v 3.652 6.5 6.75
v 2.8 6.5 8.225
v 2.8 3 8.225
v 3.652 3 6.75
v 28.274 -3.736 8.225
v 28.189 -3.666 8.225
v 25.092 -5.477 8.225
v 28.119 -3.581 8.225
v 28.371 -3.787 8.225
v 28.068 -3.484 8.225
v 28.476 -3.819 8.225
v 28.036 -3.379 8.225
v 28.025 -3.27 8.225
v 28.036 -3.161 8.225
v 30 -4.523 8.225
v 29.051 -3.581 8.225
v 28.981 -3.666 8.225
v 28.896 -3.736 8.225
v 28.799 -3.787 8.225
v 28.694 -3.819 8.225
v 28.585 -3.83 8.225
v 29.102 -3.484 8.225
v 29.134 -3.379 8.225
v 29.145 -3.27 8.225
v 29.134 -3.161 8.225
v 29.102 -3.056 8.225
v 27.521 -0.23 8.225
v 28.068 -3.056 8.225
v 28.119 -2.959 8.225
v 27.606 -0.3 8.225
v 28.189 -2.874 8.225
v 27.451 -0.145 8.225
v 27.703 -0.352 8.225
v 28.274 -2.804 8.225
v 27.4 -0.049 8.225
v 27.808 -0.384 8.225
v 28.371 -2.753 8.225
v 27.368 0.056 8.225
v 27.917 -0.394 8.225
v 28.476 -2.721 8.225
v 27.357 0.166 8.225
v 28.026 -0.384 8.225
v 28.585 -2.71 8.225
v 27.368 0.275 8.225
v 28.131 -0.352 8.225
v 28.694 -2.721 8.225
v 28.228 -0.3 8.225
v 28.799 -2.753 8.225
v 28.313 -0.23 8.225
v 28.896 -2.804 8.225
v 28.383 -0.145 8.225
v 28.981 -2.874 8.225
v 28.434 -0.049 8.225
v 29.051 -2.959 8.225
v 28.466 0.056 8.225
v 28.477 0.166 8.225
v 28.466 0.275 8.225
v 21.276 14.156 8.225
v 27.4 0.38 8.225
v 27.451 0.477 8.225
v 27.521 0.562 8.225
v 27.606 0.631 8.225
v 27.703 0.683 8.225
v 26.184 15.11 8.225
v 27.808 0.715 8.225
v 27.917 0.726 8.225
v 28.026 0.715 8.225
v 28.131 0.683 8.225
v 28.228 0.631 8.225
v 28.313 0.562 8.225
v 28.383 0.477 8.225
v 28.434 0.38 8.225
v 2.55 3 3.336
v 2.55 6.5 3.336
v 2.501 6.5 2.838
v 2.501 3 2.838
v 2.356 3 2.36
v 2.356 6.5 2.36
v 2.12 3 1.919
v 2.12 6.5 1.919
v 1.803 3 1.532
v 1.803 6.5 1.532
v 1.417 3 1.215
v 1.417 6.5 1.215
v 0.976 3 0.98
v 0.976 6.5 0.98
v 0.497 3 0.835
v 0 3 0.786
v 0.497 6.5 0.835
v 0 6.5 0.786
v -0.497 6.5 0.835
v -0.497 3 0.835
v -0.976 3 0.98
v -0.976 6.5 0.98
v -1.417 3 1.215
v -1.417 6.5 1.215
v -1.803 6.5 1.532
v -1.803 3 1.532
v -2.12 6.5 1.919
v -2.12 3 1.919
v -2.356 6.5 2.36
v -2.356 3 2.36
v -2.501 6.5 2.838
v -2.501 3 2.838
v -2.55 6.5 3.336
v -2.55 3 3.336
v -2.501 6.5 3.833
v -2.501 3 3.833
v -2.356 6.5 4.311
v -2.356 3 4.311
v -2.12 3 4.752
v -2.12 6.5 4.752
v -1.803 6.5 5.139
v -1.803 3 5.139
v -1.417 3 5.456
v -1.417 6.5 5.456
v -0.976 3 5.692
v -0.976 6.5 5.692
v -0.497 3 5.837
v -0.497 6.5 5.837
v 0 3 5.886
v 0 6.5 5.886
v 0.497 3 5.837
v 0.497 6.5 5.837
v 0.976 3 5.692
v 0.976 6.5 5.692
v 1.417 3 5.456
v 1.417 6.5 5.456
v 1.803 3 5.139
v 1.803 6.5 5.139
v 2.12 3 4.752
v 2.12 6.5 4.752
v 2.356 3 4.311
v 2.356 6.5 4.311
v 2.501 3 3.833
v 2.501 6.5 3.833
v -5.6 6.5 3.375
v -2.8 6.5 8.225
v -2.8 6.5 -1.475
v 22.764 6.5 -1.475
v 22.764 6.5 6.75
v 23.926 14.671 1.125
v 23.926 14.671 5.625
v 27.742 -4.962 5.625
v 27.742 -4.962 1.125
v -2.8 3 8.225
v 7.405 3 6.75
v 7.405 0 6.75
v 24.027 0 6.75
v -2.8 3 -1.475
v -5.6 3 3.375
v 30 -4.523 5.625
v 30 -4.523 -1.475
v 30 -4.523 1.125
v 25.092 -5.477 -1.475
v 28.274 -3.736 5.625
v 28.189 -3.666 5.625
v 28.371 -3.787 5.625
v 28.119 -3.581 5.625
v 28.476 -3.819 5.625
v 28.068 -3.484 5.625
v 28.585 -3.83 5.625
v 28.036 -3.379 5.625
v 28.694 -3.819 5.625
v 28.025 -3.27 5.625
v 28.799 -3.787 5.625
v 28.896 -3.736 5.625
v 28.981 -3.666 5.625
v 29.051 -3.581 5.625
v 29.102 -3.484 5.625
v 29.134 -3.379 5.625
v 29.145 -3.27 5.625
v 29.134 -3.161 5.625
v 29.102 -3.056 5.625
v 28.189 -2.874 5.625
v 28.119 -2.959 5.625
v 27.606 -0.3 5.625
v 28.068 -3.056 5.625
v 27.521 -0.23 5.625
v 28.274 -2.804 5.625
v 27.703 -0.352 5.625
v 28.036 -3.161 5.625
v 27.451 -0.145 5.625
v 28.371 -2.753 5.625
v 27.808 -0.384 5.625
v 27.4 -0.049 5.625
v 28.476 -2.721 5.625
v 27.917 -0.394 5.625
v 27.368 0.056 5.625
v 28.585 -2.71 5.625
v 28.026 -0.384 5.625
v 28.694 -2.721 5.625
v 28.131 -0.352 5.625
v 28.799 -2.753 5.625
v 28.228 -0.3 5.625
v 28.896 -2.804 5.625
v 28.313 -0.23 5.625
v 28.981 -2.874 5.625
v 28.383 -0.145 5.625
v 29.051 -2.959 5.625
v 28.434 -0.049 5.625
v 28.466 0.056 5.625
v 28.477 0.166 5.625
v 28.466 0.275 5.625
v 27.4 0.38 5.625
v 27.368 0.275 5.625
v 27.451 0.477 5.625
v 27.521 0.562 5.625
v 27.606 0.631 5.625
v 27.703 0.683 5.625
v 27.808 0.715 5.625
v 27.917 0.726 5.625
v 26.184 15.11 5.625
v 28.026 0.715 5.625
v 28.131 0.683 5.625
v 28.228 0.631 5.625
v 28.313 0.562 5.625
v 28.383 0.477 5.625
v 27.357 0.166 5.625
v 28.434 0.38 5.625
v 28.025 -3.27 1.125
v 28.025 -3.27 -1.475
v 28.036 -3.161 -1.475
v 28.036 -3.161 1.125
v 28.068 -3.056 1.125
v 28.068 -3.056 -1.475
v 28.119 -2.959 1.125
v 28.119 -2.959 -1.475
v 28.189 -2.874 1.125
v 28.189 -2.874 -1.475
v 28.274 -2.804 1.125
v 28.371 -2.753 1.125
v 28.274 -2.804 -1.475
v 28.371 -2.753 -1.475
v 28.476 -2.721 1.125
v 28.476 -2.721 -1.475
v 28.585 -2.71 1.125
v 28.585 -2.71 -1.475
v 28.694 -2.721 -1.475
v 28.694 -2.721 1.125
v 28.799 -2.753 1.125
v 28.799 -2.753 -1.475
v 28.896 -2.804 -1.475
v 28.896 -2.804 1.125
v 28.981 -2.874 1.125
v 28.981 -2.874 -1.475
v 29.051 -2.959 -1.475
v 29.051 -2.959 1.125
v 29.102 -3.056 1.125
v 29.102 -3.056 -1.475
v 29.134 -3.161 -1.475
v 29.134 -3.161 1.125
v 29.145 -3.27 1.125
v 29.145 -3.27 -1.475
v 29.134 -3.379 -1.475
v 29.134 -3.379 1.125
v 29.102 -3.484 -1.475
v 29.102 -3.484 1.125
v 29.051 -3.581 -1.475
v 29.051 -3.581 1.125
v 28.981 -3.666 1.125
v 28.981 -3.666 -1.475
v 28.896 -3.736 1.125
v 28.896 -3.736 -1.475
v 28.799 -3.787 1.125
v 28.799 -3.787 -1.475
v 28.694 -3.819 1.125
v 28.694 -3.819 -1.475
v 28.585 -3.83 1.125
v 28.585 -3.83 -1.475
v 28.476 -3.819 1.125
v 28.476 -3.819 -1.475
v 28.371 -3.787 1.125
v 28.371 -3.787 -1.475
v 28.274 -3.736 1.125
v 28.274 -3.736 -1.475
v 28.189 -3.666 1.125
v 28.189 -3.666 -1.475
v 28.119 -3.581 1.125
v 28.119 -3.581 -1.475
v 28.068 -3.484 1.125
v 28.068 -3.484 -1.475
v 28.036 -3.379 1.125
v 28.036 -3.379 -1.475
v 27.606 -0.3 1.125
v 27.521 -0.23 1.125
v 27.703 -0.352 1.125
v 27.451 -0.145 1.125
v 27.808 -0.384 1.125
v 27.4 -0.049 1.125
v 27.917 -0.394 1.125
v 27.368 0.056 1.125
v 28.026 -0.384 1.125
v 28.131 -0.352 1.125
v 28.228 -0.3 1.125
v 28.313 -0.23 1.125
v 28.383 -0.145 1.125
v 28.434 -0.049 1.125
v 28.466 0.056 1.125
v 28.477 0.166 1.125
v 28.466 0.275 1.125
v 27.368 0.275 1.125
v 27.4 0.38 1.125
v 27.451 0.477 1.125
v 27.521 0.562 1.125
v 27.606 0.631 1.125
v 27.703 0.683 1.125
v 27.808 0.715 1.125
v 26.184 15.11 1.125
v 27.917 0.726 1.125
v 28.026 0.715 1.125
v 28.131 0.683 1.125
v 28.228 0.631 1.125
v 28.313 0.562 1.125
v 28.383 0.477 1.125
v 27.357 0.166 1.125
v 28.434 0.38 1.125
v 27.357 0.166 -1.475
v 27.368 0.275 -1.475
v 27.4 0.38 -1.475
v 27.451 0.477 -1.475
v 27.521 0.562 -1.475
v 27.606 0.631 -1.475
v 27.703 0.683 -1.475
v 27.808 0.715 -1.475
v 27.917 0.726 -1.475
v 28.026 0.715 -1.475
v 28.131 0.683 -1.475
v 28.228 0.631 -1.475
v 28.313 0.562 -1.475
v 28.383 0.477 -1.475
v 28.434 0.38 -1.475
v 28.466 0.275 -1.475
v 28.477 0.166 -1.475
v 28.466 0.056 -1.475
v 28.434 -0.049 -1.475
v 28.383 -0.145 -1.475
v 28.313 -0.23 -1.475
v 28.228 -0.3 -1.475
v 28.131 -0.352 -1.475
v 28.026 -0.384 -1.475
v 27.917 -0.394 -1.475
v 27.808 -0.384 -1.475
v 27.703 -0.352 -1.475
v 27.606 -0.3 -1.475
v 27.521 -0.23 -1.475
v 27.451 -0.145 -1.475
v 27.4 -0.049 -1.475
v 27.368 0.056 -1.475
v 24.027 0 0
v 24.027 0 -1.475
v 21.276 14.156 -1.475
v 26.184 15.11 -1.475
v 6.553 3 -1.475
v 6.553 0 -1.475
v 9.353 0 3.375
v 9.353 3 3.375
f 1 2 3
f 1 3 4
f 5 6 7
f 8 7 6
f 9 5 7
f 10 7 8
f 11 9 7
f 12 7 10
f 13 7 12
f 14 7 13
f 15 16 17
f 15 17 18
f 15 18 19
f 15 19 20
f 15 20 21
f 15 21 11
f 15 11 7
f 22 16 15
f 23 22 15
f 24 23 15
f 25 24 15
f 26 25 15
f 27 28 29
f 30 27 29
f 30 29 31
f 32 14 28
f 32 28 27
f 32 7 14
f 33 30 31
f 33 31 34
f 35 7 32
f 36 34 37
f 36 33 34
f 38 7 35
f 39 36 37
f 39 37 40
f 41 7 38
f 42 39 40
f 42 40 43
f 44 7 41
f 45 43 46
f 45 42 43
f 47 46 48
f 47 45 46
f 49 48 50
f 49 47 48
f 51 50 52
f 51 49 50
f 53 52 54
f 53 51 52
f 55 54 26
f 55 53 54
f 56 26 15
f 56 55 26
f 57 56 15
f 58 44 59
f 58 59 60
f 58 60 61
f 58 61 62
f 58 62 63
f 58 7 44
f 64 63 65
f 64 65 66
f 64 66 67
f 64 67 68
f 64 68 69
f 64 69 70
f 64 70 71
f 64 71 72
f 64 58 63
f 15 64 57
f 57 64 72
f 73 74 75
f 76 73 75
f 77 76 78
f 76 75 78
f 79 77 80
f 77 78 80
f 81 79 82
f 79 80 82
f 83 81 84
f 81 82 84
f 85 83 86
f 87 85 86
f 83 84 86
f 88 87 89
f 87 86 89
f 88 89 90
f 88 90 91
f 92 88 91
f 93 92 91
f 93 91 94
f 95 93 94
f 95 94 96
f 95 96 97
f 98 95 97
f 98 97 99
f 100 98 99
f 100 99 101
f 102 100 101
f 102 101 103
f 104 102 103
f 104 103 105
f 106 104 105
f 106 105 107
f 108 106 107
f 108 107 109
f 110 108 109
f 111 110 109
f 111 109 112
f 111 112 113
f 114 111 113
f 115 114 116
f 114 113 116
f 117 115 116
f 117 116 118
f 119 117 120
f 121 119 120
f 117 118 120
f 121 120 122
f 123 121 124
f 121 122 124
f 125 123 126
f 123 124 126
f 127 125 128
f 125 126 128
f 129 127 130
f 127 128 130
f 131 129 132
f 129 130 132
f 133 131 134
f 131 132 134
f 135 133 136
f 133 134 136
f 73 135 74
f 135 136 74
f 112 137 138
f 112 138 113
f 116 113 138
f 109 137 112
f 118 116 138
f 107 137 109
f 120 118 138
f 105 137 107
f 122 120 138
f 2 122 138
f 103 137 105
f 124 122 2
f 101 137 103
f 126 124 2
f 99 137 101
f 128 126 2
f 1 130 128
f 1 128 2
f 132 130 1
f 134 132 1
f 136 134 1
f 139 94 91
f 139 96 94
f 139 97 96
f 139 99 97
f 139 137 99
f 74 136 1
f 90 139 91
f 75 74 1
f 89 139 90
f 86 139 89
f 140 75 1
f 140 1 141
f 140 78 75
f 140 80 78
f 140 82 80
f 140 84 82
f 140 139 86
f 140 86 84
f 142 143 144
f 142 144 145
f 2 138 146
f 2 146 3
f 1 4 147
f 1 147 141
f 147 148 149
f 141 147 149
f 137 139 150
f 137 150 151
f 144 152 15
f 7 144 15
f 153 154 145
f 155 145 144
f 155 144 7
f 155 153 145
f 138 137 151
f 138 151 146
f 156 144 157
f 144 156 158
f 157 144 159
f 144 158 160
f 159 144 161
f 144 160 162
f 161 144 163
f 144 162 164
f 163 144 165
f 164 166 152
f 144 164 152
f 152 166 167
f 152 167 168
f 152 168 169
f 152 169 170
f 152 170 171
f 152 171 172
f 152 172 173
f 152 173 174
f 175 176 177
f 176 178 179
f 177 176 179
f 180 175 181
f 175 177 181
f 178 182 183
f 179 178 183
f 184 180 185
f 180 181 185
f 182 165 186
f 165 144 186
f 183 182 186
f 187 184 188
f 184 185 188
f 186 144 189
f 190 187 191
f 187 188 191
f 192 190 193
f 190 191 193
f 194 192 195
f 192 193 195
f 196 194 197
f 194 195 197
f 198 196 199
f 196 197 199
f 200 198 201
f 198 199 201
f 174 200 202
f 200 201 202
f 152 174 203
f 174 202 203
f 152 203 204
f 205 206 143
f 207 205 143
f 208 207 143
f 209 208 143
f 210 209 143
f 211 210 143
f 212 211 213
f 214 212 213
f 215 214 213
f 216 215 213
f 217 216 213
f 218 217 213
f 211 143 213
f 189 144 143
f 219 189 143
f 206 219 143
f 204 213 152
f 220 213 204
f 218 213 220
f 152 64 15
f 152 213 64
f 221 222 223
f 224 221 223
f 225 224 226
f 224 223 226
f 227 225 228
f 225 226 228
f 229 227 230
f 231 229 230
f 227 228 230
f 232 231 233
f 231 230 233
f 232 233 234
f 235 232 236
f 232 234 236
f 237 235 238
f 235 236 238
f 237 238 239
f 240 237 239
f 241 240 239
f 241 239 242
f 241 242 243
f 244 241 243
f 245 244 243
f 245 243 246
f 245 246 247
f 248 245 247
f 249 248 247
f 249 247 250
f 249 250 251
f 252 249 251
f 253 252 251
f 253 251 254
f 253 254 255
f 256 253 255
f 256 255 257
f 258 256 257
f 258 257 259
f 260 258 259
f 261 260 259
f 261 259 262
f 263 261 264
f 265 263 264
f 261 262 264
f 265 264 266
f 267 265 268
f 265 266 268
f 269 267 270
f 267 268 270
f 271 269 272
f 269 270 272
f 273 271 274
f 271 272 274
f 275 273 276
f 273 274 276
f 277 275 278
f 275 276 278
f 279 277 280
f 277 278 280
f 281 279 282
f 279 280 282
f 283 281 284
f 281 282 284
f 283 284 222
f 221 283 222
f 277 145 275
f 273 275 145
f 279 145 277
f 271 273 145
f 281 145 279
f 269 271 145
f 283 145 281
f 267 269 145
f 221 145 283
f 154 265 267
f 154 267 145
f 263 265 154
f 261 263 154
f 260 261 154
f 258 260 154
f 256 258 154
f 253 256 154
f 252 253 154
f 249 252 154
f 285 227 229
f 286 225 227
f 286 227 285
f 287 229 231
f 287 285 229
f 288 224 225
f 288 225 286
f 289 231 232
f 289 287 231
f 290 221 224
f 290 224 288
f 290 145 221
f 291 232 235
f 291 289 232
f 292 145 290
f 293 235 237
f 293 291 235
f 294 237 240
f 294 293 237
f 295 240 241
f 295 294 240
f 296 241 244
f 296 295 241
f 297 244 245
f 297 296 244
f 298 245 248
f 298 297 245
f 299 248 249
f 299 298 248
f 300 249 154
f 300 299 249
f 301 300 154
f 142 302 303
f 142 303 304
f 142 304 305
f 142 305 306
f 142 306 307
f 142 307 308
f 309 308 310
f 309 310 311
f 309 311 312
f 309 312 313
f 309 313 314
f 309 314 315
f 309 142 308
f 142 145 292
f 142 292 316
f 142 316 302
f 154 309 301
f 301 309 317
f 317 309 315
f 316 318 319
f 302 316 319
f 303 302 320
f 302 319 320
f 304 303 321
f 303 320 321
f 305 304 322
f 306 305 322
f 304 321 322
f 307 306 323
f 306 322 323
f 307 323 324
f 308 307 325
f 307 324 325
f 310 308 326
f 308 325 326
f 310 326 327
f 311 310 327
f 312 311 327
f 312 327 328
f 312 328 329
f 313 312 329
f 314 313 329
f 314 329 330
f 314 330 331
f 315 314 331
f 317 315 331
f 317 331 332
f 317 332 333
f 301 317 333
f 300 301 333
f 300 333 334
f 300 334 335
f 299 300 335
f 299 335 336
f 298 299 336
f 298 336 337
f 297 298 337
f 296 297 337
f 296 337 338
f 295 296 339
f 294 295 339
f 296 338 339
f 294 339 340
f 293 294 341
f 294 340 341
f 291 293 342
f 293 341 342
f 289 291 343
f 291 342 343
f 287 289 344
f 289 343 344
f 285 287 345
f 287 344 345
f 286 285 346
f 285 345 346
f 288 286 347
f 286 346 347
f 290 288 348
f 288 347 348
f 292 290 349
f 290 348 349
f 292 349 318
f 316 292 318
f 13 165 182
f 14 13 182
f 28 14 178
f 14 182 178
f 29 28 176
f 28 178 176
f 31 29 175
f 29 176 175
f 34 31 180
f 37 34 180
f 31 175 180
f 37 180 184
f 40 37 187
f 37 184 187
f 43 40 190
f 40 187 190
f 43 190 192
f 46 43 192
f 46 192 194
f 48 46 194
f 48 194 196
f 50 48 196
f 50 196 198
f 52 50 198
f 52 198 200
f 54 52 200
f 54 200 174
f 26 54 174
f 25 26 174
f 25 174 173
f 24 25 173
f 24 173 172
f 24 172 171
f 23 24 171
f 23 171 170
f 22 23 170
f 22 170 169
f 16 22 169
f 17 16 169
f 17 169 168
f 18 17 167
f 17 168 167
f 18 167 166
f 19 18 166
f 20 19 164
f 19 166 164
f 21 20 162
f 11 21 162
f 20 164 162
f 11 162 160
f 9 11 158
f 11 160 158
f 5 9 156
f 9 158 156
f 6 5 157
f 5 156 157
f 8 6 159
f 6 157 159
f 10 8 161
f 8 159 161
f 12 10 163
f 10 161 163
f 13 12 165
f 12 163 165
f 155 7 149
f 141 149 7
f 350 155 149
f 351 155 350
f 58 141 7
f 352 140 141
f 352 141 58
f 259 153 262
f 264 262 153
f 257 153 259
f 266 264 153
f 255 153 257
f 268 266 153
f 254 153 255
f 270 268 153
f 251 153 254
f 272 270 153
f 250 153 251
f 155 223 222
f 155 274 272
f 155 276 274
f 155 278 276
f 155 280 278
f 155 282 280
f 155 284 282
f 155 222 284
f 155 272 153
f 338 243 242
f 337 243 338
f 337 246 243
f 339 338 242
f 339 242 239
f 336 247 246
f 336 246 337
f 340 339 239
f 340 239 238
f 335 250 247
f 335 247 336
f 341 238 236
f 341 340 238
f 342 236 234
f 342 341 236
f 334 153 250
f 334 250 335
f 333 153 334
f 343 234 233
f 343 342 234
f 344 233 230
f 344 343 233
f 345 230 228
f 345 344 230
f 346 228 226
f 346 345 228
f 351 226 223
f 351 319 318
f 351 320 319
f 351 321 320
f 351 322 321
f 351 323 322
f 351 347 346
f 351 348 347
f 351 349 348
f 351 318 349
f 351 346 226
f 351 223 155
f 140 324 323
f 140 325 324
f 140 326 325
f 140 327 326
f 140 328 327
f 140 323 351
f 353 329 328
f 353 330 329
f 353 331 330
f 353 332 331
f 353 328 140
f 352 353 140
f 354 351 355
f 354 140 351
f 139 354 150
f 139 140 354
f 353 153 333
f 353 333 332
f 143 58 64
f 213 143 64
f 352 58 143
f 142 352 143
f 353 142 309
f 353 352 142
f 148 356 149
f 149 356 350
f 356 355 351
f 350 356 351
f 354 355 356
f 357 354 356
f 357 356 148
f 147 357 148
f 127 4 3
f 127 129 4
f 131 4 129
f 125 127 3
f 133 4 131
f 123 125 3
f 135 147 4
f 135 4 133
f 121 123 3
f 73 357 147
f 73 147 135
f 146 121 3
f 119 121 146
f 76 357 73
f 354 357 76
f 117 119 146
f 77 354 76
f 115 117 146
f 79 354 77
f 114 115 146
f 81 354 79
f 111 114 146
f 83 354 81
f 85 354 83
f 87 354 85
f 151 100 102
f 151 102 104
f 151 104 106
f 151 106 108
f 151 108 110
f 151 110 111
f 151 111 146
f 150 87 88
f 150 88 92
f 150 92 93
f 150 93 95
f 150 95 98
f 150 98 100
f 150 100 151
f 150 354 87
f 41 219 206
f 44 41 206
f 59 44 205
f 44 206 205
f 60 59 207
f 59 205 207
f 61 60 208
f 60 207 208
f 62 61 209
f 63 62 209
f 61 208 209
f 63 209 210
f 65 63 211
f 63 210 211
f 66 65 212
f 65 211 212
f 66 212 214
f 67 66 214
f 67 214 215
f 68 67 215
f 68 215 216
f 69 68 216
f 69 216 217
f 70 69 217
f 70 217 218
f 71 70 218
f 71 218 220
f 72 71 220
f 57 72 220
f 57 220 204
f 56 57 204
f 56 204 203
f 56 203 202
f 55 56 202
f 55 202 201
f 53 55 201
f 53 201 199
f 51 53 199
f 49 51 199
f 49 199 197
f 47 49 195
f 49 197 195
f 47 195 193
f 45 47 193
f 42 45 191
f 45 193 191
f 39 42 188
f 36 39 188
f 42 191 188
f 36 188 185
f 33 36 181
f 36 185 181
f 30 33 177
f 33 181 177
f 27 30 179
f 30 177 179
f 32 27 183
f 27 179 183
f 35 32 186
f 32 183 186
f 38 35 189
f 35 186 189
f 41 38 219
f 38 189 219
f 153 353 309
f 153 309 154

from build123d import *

# Parameters (mm, degrees)
SKETCH1_W                       = 25
SKETCH1_H                       = 6.75
BOSS_EXTRUDE1_DEPTH             = 6.5
BOSS_EXTRUDE4_DEPTH             = 6.5
BOSS_EXTRUDE3_REACH             = 6.85
BOSS_EXTRUDE3_DIRECTION_2_REACH = 6.85
SKETCH4_W                       = 2.3
SKETCH4_H                       = 4.5
CUT_EXTRUDE1_DEPTH              = 23
SKETCH6_R                       = 2.55
CUT_EXTRUDE2_DEPTH              = 10
BOSS_EXTRUDE5_DEPTH             = 1.475
CUT_EXTRUDE3_DEPTH              = 3
SKETCH9_R                       = 0.56
CUT_EXTRUDE4_DEPTH              = 9.7


with BuildPart() as part:
    # Sketch1 → Boss-Extrude1 (new body)
    with BuildSketch(Plane(origin=(0, 0, 0), x_dir=(1, 0, 0), z_dir=(0, 1, 0))):
        with Locations((12.5, -3.375)):
            Rectangle(SKETCH1_W, SKETCH1_H)
    extrude(amount=BOSS_EXTRUDE1_DEPTH)

    # Sketch5 → Boss-Extrude4 (add)
    with BuildSketch(Plane(origin=(0, 6.5, 0), x_dir=(1, 0, 0), z_dir=(0, 1, 0))):
        Polygon((-5.600297611, -3.375), (-2.800148806, -8.225), (2.800148806, -8.225), (5.600297611, -3.375), (2.800148806, 1.475), (-2.800148806, 1.475), align=None)
    extrude(amount=-BOSS_EXTRUDE4_DEPTH)

    # Boss-Extrude3: up to this face of the body (flat: up to its plane)
    boss_extrude3_end = Plane(part.part.faces().sort_by_distance((0, 3.25, -1.475))[0])
    # Sketch3 → Boss-Extrude3 (add, up to the picked face)
    with BuildSketch(Plane.XY.offset(3.375), mode=Mode.PRIVATE) as boss_extrude3_sk1:
        Polygon((21.275684175, 14.155521181), (26.183820092, 15.109566157), (30, -4.522977512), (25.091864083, -5.477022488), align=None)
    boss_extrude3_tool1 = split(extrude(boss_extrude3_sk1.sketch, amount=-BOSS_EXTRUDE3_REACH, mode=Mode.PRIVATE), bisect_by=boss_extrude3_end, keep=Keep.BOTH, mode=Mode.PRIVATE)
    add(boss_extrude3_tool1.solids().sort_by_distance((25.637842, 4.816272, 3.375))[0])

    # Boss-Extrude3 direction 2: up to this face of the body (flat: up to its plane)
    boss_extrude3_direction_2_end = Plane(part.part.faces().sort_by_distance((0, 3.25, 8.225))[0])
    # Sketch3 → Boss-Extrude3 direction 2 (add, up to the picked face)
    with BuildSketch(Plane.XY.offset(3.375), mode=Mode.PRIVATE) as boss_extrude3_direction_2_sk1:
        Polygon((21.275684175, 14.155521181), (26.183820092, 15.109566157), (30, -4.522977512), (25.091864083, -5.477022488), align=None)
    boss_extrude3_direction_2_tool1 = split(extrude(boss_extrude3_direction_2_sk1.sketch, amount=BOSS_EXTRUDE3_DIRECTION_2_REACH, mode=Mode.PRIVATE), bisect_by=boss_extrude3_direction_2_end, keep=Keep.BOTH, mode=Mode.PRIVATE)
    add(boss_extrude3_direction_2_tool1.solids().sort_by_distance((25.637842, 4.816272, 3.375))[0])

    # Sketch4 → Cut-Extrude1 (cut)
    with BuildSketch(Plane(origin=(-1.876769127, 9.65514015, 0), x_dir=(0.981627183, 0.190808995, 0), z_dir=(-0.190808995, 0.981627183, 0))):
        with Locations((27.435790708, -3.375)):
            Rectangle(SKETCH4_W, SKETCH4_H)
    extrude(amount=-CUT_EXTRUDE1_DEPTH, mode=Mode.SUBTRACT)

    # Sketch6 → Cut-Extrude2 (cut)
    with BuildSketch(Plane(origin=(0, 6.5, 0), x_dir=(1, 0, 0), z_dir=(0, 1, 0))):
        with Locations((0, -3.335615973)):
            Circle(SKETCH6_R)
    extrude(amount=-CUT_EXTRUDE2_DEPTH, mode=Mode.SUBTRACT)

    # Sketch7 → Boss-Extrude5 (add)
    with BuildSketch(Plane(origin=(0, 0, -1.475), x_dir=(-1, 0, 0), z_dir=(0, 0, -1))):
        Polygon((-2.800148806, 0), (-24.027238758, 0), (-25.091864083, -5.477022488), (-30, -4.522977512), (-26.183820092, 15.109566157), (-21.275684175, 14.155521181), (-22.763766749, 6.5), (-2.800148806, 6.5), align=None)
    extrude(amount=-BOSS_EXTRUDE5_DEPTH)

    # Sketch8 → Cut-Extrude3 (cut)
    with BuildSketch(Plane(origin=(0, 0, 0), x_dir=(-1, 0, 0), z_dir=(0, -1, 0))):
        Polygon((-4.67653718, -11.475), (4.67653718, -11.475), (9.353074361, -3.375), (4.67653718, 4.725), (-4.67653718, 4.725), (-9.353074361, -3.375), align=None)
    extrude(amount=-CUT_EXTRUDE3_DEPTH, mode=Mode.SUBTRACT)

    # Sketch9 → Cut-Extrude4 (cut)
    with BuildSketch(Plane(origin=(0, 0, -1.475), x_dir=(-1, 0, 0), z_dir=(0, 0, -1))):
        with Locations((-28.584915246, -3.269967081)):
            Circle(SKETCH9_R)
        with Locations((-27.917083762, 0.165728061)):
            Circle(SKETCH9_R)
    extrude(amount=-CUT_EXTRUDE4_DEPTH, mode=Mode.SUBTRACT)


solid = part.part
